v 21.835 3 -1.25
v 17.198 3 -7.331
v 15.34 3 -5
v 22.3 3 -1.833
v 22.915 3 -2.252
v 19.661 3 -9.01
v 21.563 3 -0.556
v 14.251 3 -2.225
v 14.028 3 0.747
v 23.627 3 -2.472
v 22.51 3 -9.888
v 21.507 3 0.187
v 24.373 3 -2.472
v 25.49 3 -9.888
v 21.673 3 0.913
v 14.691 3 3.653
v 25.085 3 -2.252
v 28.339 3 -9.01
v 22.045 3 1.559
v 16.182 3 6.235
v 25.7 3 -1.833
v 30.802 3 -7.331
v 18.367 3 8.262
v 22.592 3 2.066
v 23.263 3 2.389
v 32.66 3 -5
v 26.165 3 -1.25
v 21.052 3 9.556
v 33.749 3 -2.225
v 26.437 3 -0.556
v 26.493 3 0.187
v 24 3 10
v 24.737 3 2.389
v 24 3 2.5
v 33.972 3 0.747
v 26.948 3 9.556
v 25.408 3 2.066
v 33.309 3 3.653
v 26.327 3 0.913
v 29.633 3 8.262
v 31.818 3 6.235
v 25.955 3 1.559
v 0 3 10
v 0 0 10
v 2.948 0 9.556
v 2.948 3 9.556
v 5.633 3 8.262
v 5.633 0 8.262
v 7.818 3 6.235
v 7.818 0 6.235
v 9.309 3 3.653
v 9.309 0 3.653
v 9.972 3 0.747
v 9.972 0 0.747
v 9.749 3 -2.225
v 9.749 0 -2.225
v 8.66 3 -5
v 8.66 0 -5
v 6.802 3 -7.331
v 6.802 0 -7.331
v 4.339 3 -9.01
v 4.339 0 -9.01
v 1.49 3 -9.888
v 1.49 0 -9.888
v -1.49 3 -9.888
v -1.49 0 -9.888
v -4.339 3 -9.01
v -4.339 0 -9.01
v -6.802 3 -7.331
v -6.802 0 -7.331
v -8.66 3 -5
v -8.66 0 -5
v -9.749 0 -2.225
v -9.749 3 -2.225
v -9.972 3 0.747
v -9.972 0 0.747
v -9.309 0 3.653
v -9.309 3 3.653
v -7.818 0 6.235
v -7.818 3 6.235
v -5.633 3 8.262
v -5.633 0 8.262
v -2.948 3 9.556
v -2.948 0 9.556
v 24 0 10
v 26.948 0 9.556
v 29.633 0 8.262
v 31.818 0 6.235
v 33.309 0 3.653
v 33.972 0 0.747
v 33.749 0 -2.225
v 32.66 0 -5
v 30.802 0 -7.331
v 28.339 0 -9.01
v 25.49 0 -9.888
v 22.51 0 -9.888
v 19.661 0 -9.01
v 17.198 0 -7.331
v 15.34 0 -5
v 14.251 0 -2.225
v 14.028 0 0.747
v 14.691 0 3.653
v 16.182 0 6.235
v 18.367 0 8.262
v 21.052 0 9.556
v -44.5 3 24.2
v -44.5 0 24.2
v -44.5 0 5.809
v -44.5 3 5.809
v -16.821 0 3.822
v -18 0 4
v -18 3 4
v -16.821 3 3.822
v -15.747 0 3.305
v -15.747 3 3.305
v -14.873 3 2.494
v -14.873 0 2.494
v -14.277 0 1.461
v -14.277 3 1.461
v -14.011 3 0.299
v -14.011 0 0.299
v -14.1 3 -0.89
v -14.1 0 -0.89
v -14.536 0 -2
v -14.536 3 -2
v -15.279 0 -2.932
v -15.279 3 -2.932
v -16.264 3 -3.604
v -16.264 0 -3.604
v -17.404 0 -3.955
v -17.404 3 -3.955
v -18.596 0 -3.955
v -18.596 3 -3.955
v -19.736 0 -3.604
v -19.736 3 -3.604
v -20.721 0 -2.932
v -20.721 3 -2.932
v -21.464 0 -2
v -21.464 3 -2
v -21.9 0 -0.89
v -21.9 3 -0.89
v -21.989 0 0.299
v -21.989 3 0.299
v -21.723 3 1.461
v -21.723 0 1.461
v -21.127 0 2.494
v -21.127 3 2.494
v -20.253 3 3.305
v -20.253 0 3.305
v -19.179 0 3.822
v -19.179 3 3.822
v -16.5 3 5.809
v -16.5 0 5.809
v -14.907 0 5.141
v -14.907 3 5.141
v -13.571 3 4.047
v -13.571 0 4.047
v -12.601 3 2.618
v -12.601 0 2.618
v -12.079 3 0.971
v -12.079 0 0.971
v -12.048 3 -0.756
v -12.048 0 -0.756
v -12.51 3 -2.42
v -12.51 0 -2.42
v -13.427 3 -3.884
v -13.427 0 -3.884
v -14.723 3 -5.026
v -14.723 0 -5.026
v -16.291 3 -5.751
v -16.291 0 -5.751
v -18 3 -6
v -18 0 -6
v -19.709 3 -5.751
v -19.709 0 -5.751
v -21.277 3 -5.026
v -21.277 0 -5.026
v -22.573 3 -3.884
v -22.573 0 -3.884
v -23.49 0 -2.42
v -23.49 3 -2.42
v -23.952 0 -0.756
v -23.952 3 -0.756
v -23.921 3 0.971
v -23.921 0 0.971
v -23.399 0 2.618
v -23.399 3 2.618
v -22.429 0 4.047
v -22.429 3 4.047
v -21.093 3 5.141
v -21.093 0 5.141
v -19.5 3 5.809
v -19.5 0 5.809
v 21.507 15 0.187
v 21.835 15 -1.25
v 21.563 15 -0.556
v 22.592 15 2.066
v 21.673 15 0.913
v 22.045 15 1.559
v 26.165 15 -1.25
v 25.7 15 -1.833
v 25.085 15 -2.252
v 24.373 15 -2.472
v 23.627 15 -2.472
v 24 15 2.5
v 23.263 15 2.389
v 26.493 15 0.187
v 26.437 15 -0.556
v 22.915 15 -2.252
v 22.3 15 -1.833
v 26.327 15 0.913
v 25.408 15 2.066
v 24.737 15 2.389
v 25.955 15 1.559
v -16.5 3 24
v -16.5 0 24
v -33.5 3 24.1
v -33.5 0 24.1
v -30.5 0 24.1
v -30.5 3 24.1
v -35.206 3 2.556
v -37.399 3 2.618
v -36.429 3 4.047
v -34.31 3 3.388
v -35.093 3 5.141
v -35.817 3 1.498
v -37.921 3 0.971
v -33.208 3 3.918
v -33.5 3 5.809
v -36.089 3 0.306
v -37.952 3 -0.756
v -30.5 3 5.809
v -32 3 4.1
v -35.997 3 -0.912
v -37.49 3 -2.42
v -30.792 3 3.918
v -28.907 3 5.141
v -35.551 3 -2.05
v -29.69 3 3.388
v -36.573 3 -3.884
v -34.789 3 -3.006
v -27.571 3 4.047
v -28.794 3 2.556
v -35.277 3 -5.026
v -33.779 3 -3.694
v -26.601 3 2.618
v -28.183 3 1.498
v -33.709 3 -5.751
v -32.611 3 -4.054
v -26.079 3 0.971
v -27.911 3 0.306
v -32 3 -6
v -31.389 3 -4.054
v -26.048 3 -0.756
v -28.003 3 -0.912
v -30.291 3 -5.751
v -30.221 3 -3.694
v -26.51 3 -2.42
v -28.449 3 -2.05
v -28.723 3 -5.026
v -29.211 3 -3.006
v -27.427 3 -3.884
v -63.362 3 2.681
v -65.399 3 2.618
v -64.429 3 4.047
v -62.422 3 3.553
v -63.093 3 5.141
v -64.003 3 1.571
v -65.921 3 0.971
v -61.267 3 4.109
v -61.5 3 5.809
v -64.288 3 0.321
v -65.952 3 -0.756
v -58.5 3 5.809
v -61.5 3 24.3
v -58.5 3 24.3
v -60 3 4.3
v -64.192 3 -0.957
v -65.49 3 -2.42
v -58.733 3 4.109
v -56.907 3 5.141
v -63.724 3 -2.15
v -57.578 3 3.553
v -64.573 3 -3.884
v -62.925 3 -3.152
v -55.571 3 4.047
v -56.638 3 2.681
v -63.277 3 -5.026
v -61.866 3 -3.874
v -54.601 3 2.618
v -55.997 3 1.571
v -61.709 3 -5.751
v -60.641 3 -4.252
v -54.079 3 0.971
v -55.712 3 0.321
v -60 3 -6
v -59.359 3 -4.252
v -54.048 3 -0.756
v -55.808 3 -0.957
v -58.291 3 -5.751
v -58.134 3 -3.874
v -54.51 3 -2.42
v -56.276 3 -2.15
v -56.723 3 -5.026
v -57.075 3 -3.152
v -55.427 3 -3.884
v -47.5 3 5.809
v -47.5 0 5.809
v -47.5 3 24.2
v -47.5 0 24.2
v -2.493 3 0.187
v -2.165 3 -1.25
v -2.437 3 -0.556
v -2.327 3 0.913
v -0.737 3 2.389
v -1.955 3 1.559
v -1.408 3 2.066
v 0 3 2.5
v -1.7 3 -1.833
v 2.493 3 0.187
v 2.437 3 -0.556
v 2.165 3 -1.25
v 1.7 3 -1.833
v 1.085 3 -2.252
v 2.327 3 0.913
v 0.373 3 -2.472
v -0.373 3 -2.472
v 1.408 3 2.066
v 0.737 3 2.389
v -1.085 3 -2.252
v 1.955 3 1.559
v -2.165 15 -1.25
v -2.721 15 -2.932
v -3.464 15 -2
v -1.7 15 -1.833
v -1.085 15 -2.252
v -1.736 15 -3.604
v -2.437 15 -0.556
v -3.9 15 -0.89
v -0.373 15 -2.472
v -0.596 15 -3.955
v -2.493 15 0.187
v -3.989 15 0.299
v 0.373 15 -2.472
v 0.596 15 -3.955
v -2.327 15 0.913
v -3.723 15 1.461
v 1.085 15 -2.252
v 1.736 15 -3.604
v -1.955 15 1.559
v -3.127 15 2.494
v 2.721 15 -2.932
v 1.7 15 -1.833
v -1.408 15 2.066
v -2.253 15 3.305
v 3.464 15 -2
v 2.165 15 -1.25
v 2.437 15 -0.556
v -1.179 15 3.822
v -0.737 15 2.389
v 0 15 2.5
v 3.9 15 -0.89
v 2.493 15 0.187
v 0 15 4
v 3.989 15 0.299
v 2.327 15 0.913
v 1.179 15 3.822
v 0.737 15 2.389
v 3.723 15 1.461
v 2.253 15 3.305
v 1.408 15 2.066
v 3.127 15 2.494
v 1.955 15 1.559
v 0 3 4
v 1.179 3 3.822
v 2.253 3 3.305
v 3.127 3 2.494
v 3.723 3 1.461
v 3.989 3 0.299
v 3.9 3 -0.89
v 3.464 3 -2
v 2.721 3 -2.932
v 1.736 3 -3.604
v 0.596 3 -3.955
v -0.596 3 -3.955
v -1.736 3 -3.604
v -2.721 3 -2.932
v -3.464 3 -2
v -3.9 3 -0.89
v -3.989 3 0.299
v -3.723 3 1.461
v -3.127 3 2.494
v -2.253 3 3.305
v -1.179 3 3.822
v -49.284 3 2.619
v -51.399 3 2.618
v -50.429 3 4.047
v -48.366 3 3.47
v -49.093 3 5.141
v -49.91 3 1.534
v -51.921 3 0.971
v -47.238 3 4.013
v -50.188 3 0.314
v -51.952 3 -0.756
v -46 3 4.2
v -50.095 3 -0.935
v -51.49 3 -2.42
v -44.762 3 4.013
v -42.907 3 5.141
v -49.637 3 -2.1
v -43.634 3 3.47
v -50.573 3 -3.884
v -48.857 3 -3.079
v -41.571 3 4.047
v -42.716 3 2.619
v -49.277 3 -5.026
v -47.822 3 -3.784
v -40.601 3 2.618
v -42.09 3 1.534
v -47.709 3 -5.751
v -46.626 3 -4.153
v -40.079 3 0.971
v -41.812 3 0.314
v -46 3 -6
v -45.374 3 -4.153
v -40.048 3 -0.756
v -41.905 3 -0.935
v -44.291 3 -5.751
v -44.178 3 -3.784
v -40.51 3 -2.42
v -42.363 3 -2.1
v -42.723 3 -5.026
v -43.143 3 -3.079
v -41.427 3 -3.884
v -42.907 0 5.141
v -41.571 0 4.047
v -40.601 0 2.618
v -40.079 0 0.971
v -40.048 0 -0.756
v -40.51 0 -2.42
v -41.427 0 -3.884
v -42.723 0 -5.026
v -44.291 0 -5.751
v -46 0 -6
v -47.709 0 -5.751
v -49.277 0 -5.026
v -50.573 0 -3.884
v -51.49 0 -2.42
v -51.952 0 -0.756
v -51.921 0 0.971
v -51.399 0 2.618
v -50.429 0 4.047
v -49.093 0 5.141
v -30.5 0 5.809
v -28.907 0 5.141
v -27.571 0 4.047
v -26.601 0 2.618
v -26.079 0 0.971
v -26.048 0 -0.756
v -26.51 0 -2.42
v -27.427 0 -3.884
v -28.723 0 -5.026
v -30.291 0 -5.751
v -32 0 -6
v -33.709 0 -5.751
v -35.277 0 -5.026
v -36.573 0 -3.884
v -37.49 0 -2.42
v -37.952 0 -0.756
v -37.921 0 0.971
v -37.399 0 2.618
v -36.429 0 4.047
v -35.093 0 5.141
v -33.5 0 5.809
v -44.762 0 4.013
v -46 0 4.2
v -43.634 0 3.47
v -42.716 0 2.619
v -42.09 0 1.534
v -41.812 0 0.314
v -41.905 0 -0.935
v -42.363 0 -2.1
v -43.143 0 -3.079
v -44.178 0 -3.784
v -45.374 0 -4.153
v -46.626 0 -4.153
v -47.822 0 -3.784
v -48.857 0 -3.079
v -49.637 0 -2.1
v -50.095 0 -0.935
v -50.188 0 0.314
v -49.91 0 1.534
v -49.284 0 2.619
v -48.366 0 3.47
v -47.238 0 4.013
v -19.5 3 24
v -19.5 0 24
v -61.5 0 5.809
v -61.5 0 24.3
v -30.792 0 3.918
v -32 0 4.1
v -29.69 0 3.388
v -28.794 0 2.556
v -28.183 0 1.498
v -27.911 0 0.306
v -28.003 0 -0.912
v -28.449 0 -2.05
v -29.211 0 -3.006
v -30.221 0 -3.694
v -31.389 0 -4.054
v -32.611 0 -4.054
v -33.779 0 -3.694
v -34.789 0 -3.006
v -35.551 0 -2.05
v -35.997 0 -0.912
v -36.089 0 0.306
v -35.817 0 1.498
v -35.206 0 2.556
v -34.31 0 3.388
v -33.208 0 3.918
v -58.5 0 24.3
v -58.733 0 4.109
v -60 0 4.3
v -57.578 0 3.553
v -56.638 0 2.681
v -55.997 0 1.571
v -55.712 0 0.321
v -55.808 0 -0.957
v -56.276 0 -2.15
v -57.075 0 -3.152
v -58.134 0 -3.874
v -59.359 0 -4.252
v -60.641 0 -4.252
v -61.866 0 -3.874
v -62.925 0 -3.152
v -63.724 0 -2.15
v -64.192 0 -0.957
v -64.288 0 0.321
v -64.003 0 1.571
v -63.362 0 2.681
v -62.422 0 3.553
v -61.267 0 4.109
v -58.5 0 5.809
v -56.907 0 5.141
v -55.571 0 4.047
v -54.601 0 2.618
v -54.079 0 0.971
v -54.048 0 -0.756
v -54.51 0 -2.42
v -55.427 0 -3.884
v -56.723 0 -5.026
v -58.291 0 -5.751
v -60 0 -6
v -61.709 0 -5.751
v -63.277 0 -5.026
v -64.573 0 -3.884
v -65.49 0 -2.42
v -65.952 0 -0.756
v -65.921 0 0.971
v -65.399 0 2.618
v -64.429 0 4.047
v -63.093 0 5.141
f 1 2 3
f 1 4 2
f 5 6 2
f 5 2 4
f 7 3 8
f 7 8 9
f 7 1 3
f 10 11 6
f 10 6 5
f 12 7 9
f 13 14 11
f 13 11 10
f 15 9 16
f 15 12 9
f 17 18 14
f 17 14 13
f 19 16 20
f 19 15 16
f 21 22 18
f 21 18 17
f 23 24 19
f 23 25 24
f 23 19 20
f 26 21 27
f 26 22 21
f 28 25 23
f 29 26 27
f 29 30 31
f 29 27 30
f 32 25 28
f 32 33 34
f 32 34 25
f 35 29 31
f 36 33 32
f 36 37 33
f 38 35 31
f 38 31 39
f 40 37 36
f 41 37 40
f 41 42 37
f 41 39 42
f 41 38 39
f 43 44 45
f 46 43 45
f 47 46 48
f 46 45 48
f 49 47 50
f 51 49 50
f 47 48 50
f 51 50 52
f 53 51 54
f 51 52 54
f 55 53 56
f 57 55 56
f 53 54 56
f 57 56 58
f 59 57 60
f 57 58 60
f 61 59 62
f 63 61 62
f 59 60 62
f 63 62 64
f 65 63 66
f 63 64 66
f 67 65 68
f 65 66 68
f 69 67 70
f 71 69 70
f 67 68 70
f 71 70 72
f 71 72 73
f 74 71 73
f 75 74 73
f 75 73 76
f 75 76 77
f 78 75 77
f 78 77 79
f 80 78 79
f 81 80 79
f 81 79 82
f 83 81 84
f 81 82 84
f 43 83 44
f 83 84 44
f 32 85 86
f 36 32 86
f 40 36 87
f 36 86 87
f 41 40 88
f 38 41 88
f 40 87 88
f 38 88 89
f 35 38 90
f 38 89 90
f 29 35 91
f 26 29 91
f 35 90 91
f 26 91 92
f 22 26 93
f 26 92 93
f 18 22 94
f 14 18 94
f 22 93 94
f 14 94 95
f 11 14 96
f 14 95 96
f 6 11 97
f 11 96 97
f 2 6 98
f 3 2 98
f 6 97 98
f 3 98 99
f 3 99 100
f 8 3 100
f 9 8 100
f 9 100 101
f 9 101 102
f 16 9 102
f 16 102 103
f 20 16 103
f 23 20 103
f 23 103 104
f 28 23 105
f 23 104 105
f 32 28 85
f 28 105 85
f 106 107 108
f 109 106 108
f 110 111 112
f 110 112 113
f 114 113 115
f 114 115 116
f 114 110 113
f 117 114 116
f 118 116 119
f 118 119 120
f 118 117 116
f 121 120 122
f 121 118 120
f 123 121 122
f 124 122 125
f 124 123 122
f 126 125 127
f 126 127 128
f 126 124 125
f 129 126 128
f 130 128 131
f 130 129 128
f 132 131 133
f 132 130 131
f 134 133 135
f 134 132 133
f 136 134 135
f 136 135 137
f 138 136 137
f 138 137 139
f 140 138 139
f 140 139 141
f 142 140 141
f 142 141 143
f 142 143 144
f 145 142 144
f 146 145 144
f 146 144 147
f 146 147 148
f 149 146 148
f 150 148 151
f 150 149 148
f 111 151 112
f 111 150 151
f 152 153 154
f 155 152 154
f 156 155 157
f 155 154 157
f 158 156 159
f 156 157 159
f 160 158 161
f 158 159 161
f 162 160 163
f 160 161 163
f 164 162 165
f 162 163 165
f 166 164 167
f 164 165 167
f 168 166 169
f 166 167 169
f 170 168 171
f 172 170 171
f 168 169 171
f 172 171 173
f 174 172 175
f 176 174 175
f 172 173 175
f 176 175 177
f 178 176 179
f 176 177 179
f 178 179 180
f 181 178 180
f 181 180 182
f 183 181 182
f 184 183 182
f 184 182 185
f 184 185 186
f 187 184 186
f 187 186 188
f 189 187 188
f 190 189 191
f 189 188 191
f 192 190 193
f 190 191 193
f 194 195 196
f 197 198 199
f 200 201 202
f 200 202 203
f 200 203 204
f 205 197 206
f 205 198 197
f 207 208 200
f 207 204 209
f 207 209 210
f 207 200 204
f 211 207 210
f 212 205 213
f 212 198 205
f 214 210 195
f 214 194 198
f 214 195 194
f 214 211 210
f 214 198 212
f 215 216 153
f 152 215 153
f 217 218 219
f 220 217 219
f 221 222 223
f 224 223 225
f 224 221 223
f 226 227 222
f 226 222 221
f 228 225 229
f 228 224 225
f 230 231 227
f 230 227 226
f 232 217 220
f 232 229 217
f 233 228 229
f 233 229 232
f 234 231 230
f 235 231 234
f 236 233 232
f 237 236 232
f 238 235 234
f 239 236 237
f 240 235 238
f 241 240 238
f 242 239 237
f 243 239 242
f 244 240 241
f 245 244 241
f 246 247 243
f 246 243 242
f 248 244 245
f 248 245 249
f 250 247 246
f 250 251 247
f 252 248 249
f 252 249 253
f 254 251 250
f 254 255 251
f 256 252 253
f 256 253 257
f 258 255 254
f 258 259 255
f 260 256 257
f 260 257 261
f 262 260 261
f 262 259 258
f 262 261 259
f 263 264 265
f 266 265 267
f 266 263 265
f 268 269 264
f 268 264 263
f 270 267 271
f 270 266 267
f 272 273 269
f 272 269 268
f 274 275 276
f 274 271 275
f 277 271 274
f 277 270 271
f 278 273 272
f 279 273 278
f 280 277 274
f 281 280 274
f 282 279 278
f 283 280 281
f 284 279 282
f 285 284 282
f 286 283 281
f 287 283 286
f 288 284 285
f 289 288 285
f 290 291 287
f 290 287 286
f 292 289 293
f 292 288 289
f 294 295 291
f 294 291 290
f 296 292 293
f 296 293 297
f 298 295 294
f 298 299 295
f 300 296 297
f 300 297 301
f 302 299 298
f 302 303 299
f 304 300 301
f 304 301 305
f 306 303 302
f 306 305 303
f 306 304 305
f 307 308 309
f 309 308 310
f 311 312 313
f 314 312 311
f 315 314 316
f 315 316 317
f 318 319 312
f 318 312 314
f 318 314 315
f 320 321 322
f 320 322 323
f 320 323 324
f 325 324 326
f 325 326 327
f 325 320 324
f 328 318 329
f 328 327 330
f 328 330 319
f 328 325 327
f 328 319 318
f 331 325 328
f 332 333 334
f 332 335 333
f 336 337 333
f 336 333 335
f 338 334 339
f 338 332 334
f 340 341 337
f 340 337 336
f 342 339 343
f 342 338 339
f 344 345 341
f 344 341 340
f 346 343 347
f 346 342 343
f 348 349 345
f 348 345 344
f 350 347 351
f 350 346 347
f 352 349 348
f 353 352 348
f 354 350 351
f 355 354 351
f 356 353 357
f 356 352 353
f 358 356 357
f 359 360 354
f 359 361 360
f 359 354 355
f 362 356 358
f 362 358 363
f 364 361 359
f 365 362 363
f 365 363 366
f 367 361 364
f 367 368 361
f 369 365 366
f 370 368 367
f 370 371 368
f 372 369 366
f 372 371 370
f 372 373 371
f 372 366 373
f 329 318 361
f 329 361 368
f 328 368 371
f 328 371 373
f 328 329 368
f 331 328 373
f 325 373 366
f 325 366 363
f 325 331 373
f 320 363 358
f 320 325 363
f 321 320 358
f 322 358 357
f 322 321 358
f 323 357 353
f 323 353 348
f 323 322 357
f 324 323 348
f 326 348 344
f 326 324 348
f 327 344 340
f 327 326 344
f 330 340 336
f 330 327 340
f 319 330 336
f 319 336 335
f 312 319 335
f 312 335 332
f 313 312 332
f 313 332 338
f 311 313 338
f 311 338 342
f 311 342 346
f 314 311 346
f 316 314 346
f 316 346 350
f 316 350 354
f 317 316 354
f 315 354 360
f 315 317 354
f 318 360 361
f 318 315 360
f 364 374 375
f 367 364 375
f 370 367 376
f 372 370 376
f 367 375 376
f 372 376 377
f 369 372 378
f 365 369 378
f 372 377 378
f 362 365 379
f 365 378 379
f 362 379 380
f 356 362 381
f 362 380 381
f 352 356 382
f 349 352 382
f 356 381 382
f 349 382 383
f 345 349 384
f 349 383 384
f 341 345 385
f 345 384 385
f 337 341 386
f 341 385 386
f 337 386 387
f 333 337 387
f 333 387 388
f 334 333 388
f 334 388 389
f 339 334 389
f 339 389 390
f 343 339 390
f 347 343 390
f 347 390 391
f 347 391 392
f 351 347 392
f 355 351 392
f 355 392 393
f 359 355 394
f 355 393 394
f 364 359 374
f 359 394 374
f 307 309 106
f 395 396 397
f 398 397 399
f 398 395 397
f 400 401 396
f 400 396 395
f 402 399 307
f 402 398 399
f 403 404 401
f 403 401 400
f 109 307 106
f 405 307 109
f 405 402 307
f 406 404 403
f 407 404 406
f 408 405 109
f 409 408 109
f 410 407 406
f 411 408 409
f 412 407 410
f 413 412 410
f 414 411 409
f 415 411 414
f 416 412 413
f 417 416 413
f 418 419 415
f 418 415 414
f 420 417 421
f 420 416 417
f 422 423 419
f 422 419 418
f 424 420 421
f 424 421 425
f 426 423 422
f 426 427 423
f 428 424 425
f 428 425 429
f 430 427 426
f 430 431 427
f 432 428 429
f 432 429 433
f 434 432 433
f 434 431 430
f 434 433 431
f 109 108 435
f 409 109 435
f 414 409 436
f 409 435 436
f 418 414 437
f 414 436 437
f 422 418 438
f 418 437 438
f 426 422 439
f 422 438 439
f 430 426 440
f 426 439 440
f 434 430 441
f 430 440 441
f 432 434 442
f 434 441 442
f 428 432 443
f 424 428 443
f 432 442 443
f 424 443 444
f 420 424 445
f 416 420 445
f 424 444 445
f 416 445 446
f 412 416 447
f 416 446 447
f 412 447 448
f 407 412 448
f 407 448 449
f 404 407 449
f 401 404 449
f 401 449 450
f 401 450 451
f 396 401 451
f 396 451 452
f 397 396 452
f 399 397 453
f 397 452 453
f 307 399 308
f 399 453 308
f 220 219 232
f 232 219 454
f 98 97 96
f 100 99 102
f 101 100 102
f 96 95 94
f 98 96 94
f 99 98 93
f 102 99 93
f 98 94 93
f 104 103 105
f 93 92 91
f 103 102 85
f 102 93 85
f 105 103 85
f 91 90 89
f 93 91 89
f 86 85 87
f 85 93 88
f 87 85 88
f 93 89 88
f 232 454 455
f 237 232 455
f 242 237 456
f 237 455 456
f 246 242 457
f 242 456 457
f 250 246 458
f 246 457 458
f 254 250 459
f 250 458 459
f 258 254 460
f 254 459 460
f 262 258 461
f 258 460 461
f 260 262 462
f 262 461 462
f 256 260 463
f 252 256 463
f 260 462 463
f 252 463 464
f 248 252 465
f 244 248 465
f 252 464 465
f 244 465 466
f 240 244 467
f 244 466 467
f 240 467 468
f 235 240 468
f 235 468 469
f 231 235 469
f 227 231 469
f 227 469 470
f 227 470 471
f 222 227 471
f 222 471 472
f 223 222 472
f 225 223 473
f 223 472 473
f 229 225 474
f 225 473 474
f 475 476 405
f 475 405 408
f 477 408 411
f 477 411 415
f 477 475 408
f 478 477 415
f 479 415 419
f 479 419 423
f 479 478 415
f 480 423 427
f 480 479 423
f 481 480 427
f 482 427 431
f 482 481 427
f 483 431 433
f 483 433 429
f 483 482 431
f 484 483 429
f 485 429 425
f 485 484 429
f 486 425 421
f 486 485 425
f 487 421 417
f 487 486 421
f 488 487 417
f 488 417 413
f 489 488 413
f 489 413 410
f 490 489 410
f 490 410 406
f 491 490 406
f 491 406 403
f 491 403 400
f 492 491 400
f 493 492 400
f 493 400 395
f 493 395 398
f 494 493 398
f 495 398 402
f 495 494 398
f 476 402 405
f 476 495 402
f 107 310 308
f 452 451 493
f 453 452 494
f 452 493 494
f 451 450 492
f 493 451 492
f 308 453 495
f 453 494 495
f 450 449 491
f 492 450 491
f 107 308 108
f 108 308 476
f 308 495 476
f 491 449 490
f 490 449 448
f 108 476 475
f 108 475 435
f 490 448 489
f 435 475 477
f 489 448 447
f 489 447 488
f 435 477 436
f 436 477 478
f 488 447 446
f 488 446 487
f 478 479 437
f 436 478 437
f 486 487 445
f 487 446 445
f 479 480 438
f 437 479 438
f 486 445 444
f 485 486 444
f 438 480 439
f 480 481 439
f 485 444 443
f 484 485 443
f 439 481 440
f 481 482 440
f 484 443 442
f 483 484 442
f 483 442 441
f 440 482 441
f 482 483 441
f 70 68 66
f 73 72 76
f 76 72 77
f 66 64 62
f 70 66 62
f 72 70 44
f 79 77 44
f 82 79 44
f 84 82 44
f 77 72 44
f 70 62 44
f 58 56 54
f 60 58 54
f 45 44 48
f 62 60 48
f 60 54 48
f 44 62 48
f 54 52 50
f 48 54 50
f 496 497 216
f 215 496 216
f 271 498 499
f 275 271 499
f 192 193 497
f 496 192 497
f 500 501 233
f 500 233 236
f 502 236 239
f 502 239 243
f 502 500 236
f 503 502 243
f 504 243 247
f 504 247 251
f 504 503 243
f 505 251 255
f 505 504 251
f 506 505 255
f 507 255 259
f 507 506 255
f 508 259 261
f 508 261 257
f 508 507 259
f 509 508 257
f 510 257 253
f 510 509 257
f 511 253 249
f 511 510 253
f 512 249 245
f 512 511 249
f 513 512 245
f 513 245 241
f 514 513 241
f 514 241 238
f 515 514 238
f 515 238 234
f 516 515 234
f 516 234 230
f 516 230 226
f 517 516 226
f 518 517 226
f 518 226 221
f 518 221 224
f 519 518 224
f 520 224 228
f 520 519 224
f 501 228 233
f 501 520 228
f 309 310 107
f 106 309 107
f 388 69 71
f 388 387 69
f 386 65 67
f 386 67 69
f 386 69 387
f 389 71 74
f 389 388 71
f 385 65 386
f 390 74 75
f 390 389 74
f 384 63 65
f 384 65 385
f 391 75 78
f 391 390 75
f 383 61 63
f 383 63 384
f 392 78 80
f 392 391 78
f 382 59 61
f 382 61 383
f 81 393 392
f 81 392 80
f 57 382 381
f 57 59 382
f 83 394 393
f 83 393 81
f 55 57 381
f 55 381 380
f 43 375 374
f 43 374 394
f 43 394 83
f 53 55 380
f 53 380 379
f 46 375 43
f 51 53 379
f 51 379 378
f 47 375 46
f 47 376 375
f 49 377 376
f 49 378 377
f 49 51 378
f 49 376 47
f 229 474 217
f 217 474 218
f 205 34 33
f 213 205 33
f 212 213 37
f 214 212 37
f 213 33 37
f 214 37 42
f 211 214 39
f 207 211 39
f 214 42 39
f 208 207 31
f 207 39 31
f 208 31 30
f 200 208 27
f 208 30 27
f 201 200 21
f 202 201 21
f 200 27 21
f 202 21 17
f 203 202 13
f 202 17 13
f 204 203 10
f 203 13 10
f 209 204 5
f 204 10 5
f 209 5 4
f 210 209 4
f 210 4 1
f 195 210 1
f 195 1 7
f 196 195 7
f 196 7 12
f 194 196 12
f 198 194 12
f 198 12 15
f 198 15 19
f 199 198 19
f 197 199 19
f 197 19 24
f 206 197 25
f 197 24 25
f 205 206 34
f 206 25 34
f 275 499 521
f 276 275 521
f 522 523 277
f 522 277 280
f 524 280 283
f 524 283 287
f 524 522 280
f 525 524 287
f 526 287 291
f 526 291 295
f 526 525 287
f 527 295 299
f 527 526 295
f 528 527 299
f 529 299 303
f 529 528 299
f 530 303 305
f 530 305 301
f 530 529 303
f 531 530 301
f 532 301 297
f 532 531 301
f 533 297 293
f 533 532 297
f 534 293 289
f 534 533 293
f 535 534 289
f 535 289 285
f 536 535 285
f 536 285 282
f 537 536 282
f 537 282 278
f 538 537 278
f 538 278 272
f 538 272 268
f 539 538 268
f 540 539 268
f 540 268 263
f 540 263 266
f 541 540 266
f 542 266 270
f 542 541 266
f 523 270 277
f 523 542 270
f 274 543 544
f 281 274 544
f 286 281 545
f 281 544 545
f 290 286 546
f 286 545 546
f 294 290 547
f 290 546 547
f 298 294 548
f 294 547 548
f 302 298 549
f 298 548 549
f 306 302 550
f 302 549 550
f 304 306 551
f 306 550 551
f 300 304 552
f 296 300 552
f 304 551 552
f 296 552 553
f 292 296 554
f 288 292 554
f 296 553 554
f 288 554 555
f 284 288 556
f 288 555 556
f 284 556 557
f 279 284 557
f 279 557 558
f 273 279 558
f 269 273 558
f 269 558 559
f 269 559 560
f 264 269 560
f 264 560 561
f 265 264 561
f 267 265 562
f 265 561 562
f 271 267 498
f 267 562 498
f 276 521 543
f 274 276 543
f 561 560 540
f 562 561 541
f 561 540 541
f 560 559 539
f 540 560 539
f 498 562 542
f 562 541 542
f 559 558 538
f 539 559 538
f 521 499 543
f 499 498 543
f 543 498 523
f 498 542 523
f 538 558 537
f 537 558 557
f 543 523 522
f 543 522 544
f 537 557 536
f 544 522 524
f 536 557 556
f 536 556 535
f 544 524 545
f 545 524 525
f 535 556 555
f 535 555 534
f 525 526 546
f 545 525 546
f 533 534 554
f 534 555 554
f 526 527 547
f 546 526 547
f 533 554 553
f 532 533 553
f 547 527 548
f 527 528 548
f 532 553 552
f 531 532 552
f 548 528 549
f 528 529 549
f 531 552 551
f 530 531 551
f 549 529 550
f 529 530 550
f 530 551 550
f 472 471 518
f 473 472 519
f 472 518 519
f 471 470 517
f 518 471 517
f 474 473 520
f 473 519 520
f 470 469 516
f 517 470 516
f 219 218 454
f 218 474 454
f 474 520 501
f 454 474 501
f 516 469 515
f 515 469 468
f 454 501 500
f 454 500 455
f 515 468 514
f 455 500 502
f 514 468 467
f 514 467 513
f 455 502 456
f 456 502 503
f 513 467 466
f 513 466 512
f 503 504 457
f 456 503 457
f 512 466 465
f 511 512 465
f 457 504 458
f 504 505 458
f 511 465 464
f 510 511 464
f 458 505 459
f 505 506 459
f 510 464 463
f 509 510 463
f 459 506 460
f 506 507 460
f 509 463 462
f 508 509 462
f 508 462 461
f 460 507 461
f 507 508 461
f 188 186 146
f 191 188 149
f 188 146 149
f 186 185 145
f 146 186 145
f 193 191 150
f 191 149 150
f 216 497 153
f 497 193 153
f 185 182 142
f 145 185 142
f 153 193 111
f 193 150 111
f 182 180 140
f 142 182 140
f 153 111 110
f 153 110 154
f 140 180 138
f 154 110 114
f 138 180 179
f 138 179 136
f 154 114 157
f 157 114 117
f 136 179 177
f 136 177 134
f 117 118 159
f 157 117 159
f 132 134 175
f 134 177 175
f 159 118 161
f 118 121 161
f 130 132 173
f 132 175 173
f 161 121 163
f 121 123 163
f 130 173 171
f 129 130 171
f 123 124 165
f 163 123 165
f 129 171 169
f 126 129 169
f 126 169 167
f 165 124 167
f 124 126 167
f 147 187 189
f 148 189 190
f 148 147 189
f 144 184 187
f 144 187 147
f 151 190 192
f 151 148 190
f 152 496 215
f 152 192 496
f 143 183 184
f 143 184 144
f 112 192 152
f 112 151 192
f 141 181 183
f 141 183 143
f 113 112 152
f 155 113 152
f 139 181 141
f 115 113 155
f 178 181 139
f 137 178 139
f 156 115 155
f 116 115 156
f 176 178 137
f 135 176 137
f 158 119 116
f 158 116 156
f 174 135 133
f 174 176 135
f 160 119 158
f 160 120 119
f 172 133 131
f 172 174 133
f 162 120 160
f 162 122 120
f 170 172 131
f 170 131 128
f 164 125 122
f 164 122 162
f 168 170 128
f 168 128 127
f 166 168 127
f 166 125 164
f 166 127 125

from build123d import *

# Parameters (mm, degrees)
SKETCH_1_R        = 10
EXTRUDE_1_DEPTH   = 3
EXTRUDE_1_2_DEPTH = 3
SKETCH_4_R        = 2.5
EXTRUDE_2_DEPTH   = 12
SKETCH_3_R        = 4
SKETCH_3_R_2      = 2.5
EXTRUDE_3_DEPTH   = 12
SKETCH_5_R        = 4.3
EXTRUDE_4_DEPTH   = 3
SKETCH_5_R_2      = 4.2
EXTRUDE_4_2_DEPTH = 3
SKETCH_5_R_3      = 4.1
EXTRUDE_4_3_DEPTH = 3
SKETCH_5_R_4      = 4
EXTRUDE_4_4_DEPTH = 3


with BuildPart() as part:
    # Эскиз1 → Бобышка-Вытянуть1 (new body)
    with BuildSketch(Plane(origin=(0, 0, 0), x_dir=(1, 0, 0), z_dir=(0, 1, 0))):
        with Locations(Location((0, 0, 0), (0, 0, 270))):
            Circle(SKETCH_1_R)
    extrude(amount=EXTRUDE_1_DEPTH)

    # Эскиз3 → Бобышка-Вытянуть3 (add)
    with BuildSketch(Plane(origin=(0, 3, 0), x_dir=(1, 0, 0), z_dir=(0, 1, 0))):
        with Locations(Location((0, 0, 0), (0, 0, 270))):
            Circle(SKETCH_3_R)
        with Locations(Location((0, 0, 0), (0, 0, 270))):
            Circle(SKETCH_3_R_2, mode=Mode.SUBTRACT)
    extrude(amount=EXTRUDE_3_DEPTH)


with BuildPart() as body_2:
    # Эскиз1 → Extrude 1 2 (new body)
    with BuildSketch(Plane(origin=(0, 0, 0), x_dir=(1, 0, 0), z_dir=(0, 1, 0))):
        with Locations(Location((24, 0, 0), (0, 0, 270))):
            Circle(SKETCH_1_R)
    extrude(amount=EXTRUDE_1_2_DEPTH)

    # Эскиз4 → Бобышка-Вытянуть2 (add)
    with BuildSketch(Plane(origin=(0, 3, 0), x_dir=(1, 0, 0), z_dir=(0, 1, 0))):
        with Locations(Location((24, 0, 0), (0, 0, 270))):
            Circle(SKETCH_4_R)
    extrude(amount=EXTRUDE_2_DEPTH)


with BuildPart() as body_3:
    # Эскиз5 → Бобышка-Вытянуть4 (new body)
    with BuildSketch(Plane(origin=(0, 0, 0), x_dir=(1, 0, 0), z_dir=(0, 1, 0))):
        with BuildLine():
            Line((-61.5, -24.3), (-58.5, -24.3))
            Line((-58.5, -24.3), (-58.5, -5.809475019))
            ThreePointArc((-58.5, -5.809475019), (-60, 6), (-61.5, -5.809475019))
            Line((-61.5, -5.809475019), (-61.5, -24.3))
        make_face()
        with Locations(Location((-60, 0, 0), (0, 0, 270))):
            Circle(SKETCH_5_R, mode=Mode.SUBTRACT)
    extrude(amount=EXTRUDE_4_DEPTH)


with BuildPart() as body_4:
    # Эскиз5 → Extrude 4 2 (new body)
    with BuildSketch(Plane(origin=(0, 0, 0), x_dir=(1, 0, 0), z_dir=(0, 1, 0))):
        with BuildLine():
            Line((-47.5, -24.2), (-44.5, -24.2))
            Line((-44.5, -24.2), (-44.5, -5.809475019))
            ThreePointArc((-44.5, -5.809475019), (-46, 6), (-47.5, -5.809475019))
            Line((-47.5, -5.809475019), (-47.5, -24.2))
        make_face()
        with Locations(Location((-46, 0, 0), (0, 0, 270))):
            Circle(SKETCH_5_R_2, mode=Mode.SUBTRACT)
    extrude(amount=EXTRUDE_4_2_DEPTH)


with BuildPart() as body_5:
    # Эскиз5 → Extrude 4 3 (new body)
    with BuildSketch(Plane(origin=(0, 0, 0), x_dir=(1, 0, 0), z_dir=(0, 1, 0))):
        with BuildLine():
            Line((-33.5, -24.1), (-30.5, -24.1))
            Line((-30.5, -24.1), (-30.5, -5.809475019))
            ThreePointArc((-30.5, -5.809475019), (-32, 6), (-33.5, -5.809475019))
            Line((-33.5, -5.809475019), (-33.5, -24.1))
        make_face()
        with Locations(Location((-32, 0, 0), (0, 0, 270))):
            Circle(SKETCH_5_R_3, mode=Mode.SUBTRACT)
    extrude(amount=EXTRUDE_4_3_DEPTH)


with BuildPart() as body_6:
    # Эскиз5 → Extrude 4 4 (new body)
    with BuildSketch(Plane(origin=(0, 0, 0), x_dir=(1, 0, 0), z_dir=(0, 1, 0))):
        with BuildLine():
            Line((-19.5, -24), (-16.5, -24))
            Line((-16.5, -24), (-16.5, -5.809475019))
            ThreePointArc((-16.5, -5.809475019), (-18, 6), (-19.5, -5.809475019))
            Line((-19.5, -5.809475019), (-19.5, -24))
        make_face()
        with Locations(Location((-18, 0, 0), (0, 0, 270))):
            Circle(SKETCH_5_R_4, mode=Mode.SUBTRACT)
    extrude(amount=EXTRUDE_4_4_DEPTH)


solid = Compound([part.part, body_2.part, body_3.part, body_4.part, body_5.part, body_6.part])
